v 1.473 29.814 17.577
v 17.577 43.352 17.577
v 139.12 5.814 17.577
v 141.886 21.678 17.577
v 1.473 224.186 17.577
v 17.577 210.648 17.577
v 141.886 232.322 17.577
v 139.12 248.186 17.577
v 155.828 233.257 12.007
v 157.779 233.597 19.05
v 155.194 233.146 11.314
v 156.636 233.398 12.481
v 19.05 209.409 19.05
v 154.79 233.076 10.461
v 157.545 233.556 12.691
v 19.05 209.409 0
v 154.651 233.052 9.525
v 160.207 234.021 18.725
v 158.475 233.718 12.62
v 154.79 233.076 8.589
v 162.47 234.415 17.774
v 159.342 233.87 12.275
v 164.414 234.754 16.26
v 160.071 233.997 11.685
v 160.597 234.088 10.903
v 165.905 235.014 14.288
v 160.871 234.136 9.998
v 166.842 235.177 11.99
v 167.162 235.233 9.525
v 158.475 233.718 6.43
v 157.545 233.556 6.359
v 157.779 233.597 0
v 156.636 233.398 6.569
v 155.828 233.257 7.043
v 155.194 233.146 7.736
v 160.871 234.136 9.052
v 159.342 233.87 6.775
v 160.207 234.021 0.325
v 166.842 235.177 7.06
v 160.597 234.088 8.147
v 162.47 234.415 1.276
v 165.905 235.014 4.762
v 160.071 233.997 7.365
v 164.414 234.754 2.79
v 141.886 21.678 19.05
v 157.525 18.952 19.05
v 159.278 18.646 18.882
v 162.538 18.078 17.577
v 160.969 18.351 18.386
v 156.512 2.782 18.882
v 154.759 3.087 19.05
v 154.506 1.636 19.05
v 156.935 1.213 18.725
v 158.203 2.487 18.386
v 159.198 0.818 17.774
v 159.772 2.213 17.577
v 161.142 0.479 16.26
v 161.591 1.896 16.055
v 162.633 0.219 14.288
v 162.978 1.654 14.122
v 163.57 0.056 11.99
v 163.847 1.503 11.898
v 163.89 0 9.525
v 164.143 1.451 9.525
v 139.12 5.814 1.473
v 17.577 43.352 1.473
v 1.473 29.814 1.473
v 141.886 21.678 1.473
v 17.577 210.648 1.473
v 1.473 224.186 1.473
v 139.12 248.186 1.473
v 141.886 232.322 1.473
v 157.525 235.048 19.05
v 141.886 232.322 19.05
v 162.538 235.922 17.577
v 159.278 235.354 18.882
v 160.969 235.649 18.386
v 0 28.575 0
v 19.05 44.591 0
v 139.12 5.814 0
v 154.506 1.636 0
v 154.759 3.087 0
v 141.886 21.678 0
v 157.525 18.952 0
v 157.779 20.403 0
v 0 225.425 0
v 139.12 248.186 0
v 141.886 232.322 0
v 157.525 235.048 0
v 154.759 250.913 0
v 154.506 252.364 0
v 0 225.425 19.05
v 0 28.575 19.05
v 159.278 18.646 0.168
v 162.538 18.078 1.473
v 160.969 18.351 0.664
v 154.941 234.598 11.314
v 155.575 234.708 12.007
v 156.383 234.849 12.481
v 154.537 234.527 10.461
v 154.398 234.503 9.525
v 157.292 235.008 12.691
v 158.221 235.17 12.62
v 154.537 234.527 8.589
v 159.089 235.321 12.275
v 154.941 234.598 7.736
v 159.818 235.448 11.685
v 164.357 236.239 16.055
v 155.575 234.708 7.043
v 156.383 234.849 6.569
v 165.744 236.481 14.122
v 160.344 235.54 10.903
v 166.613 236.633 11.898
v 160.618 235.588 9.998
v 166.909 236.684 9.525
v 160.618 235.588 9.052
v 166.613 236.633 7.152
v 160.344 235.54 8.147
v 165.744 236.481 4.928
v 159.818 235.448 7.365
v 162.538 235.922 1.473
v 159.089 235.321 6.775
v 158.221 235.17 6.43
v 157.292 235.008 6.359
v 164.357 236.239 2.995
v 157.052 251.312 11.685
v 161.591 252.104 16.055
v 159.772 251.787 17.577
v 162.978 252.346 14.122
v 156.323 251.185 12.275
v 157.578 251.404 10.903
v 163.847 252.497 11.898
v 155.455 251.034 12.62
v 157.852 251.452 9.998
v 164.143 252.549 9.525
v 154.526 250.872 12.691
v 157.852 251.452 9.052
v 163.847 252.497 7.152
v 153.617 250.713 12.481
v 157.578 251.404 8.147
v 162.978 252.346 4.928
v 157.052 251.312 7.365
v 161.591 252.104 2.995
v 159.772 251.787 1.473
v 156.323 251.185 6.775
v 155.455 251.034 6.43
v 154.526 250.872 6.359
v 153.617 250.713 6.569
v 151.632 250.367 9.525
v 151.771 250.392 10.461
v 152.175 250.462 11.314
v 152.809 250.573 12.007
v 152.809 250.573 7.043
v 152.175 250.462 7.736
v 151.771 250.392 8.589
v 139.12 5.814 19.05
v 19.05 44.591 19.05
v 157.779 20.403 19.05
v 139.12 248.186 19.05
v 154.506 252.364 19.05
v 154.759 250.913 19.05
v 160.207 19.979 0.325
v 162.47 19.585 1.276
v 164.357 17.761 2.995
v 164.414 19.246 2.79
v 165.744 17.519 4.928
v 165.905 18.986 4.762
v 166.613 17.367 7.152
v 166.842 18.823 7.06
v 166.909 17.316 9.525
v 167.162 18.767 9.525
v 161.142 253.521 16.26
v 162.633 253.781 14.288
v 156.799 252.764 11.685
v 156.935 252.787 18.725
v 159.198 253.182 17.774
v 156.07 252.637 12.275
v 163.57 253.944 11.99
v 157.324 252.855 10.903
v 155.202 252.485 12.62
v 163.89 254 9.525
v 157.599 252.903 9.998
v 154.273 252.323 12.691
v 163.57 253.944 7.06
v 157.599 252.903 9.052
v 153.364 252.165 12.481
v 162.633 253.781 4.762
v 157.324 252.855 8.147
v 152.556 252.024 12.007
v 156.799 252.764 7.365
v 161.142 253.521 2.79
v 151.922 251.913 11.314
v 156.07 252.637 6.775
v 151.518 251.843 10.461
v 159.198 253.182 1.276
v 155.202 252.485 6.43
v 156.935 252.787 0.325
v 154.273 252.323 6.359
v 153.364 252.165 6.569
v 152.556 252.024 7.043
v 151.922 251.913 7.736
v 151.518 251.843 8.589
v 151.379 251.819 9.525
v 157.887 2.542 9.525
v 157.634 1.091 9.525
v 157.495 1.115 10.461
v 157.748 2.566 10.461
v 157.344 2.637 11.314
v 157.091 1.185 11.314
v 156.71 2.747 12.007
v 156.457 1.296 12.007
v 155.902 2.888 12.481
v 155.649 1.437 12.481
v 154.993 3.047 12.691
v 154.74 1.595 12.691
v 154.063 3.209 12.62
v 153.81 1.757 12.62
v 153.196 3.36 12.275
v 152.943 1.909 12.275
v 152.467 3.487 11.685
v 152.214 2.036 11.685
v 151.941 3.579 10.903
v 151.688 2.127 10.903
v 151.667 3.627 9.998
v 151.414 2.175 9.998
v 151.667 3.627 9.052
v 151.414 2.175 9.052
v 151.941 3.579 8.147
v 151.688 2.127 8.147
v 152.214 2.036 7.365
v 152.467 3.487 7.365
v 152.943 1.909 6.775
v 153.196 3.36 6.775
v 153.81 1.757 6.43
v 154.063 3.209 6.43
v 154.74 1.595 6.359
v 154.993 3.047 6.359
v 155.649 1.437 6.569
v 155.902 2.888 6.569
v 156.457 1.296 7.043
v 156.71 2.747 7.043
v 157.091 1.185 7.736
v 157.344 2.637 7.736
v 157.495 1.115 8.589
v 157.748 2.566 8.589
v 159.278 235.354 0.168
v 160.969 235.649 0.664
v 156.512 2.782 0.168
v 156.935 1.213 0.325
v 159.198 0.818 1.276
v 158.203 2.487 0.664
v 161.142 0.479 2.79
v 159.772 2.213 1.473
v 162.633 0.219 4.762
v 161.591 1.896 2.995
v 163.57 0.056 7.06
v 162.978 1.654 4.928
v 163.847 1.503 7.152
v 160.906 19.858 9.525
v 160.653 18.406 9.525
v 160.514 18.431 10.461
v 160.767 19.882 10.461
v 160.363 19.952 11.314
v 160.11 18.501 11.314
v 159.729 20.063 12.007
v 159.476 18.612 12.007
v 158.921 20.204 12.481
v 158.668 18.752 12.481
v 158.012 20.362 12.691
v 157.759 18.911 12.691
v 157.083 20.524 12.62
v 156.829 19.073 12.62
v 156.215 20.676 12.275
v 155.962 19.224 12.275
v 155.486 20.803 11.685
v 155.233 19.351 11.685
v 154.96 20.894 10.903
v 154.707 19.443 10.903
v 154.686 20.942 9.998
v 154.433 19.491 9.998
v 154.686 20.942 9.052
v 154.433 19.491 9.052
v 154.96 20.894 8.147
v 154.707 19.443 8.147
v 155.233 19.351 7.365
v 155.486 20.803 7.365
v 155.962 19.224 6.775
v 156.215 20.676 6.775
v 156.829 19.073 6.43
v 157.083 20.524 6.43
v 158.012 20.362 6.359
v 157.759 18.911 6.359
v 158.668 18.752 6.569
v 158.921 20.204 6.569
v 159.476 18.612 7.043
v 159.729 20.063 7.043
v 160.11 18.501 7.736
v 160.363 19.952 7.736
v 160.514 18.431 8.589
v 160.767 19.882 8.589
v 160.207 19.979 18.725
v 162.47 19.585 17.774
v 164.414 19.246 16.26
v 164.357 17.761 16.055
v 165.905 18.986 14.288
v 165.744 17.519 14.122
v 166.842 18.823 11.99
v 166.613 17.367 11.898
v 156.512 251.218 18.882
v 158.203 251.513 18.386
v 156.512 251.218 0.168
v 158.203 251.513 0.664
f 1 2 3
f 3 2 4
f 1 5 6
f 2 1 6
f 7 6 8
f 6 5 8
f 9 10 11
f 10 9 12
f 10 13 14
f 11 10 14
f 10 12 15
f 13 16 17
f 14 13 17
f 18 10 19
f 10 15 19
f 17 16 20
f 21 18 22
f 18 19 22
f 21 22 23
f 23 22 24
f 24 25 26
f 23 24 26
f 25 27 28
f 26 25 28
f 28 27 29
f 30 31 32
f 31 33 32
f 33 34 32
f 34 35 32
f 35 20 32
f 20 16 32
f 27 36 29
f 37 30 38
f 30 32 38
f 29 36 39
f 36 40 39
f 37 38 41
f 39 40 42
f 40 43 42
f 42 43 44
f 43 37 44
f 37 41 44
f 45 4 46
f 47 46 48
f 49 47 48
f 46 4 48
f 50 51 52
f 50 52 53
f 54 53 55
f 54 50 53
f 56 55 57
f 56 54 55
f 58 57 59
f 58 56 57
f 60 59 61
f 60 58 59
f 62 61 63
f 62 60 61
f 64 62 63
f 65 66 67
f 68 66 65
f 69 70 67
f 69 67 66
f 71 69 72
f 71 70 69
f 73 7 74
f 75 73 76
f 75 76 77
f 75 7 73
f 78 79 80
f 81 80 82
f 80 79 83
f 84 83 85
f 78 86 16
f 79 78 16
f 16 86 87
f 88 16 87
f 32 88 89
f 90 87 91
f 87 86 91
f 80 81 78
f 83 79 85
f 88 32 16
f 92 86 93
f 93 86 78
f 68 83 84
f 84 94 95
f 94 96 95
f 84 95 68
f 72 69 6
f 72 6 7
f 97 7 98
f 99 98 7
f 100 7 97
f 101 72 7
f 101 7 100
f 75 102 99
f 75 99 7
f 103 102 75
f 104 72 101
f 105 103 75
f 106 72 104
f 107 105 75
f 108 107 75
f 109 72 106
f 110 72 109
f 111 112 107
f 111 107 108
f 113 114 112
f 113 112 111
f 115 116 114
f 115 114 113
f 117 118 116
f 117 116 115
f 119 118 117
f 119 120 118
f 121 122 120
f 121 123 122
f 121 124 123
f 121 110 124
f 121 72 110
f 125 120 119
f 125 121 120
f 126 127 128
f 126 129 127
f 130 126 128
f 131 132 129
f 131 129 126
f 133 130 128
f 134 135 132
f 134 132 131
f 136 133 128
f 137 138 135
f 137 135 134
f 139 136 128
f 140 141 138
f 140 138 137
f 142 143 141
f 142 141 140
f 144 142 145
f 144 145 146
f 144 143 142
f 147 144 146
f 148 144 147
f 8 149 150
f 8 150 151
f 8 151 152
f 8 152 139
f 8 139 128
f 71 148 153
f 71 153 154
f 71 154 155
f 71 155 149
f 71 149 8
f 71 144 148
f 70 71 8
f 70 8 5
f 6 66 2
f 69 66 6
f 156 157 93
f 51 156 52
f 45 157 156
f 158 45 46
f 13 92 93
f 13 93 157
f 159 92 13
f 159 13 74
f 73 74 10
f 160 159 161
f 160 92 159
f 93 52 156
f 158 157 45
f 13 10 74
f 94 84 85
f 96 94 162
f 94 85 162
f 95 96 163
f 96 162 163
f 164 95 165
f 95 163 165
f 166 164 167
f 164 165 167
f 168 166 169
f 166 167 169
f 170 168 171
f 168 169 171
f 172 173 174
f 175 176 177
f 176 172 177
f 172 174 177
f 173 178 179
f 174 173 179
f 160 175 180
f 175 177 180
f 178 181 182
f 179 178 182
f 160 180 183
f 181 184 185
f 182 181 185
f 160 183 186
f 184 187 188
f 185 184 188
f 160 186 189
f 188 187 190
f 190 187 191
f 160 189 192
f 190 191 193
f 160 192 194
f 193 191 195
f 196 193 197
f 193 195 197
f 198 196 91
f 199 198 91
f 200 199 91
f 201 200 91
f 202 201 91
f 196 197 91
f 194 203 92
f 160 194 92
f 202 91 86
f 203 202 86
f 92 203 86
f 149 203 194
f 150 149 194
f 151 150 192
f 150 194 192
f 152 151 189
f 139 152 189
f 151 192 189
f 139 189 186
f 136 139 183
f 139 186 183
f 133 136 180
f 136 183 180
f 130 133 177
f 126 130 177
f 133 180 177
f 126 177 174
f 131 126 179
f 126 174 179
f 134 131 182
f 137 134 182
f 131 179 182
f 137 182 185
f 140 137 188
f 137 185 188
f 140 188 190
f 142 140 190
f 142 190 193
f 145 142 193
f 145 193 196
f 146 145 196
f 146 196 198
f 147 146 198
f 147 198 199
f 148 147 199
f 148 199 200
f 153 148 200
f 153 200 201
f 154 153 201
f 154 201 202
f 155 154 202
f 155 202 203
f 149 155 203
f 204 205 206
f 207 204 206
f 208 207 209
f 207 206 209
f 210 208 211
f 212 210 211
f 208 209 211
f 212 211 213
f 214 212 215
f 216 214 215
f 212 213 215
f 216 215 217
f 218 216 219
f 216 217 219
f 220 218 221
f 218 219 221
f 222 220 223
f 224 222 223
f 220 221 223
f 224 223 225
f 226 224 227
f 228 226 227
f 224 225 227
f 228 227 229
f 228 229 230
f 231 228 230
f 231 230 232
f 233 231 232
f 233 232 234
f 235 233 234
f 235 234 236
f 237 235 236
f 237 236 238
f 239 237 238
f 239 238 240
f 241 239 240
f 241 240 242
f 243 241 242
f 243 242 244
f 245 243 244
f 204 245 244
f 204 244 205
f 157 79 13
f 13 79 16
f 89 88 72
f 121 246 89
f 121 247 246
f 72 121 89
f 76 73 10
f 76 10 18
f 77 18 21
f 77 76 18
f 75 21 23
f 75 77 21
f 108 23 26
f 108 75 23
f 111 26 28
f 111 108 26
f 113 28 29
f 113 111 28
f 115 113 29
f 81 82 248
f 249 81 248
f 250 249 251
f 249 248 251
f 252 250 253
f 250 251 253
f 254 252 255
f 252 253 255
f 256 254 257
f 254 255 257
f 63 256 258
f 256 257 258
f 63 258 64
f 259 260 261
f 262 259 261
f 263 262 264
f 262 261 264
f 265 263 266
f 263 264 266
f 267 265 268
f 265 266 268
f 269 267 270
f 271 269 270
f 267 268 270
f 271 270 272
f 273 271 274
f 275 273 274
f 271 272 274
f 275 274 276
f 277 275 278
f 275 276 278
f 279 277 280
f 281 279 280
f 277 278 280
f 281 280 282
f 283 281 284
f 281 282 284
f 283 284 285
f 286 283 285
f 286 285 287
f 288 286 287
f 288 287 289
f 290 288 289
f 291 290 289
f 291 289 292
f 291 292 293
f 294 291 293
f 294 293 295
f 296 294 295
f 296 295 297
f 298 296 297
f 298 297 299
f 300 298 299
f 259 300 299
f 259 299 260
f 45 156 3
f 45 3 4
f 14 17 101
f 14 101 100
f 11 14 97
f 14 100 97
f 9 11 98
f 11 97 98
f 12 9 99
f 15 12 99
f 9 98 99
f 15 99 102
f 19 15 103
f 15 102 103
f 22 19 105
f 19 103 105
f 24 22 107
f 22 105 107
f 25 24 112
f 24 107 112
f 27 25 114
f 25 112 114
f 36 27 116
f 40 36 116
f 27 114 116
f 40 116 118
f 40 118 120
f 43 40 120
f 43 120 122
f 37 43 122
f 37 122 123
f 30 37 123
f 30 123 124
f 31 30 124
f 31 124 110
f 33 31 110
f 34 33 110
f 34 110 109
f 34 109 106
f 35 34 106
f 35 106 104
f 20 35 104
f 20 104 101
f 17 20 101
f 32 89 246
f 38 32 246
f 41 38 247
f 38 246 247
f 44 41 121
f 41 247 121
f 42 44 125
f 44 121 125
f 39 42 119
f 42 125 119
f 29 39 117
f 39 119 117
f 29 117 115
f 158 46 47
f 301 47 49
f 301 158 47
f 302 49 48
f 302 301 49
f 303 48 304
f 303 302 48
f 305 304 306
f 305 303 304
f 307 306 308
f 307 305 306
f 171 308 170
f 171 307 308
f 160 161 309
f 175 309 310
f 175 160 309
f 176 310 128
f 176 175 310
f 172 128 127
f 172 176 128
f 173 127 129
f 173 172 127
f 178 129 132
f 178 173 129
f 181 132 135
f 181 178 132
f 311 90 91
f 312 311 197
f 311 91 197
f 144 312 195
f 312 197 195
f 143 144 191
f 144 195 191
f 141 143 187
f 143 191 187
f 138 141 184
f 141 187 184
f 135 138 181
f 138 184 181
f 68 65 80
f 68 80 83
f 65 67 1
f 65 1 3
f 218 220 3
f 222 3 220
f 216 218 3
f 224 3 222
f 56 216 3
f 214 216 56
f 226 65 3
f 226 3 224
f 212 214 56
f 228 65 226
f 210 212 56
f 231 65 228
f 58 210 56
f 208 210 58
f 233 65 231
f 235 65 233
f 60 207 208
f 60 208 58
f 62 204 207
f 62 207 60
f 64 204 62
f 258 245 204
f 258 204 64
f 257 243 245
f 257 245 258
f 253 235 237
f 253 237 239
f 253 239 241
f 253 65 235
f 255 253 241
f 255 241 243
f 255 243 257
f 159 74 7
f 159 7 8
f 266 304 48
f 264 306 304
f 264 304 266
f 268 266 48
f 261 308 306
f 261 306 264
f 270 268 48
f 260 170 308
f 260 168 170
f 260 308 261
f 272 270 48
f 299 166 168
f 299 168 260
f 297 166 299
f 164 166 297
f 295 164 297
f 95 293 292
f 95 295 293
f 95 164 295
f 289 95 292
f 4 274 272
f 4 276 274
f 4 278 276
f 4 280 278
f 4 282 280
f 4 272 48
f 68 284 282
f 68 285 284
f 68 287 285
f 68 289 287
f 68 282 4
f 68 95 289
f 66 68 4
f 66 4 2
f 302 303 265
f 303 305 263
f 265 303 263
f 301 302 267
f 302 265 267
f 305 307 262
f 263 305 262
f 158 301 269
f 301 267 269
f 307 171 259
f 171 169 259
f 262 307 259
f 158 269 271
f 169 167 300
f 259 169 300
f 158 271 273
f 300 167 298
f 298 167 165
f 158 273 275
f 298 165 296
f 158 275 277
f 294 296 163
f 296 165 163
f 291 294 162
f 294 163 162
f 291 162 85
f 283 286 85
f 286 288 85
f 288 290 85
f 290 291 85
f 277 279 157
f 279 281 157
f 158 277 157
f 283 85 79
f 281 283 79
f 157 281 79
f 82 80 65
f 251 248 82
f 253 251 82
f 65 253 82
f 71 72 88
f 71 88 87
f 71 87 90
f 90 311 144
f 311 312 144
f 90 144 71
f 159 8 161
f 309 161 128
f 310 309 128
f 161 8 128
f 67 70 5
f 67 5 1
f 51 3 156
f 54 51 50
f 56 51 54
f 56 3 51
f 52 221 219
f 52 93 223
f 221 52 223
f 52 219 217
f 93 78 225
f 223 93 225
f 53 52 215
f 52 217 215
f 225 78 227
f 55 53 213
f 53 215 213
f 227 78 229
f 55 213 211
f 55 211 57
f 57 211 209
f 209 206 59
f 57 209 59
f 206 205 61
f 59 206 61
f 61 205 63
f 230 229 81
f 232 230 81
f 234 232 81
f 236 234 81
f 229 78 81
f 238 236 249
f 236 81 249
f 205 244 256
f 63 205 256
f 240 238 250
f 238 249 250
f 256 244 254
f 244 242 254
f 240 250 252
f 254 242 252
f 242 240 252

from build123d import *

# Parameters (mm, degrees)
F1_DEPTH  = 19.05
F2_T      = -1.4732
F3_W      = 16.1036
F3_H      = 19.05
F4_DEPTH  = 25.4
F5_R      = 9.52499
F6_R      = 3.175
F7_DEPTH  = 250.7881261572
F8_W      = 16.1036
F8_H      = 19.05
F9_DEPTH  = 25.4
F10_R     = 9.52499
F11_R     = 3.175
F12_DEPTH = 250.7881261572


# Not quite as in the source:
# - a fillet or chamfer is up to 0.001 mm smaller than in the source, because OpenCascade refuses the exact size


with BuildPart() as f1:
    # F0 (on Top) → F1 (new body)
    with BuildSketch(Plane.XY):
        Polygon((0, 225.425), (0, 28.575), (163.8898551464, 0), (167.1619531291, 18.766882394), (19.05, 44.5909277987), (19.05, 209.4090722013), (167.1619531291, 235.233117606), (163.8898551464, 254), align=None)
    extrude(amount=F1_DEPTH)

    # F2
    f2_openings = [f1.faces().sort_by_distance(p)[0] for p in [
        (165.525904, 9.383441, 9.525),
        (165.525904, 244.616559, 9.525),
    ]]
    offset(amount=F2_T, openings=f2_openings, kind=Kind.INTERSECTION)

    # F3 (on face) → F4 (cut)
    with BuildSketch(Plane(origin=(159.0546521525, -27.731958645, 0), x_dir=(0.1717636736, 0.9851381834, 0), z_dir=(0.9851381834, -0.1717636736, 0))):
        with Locations((37.6753235911, 9.525)):
            Rectangle(F3_W, F3_H)
    extrude(amount=-F4_DEPTH, mode=Mode.SUBTRACT)

    # F5 (radius 9.525 in the source; OpenCascade refuses exactly that, so slightly less here)
    f5_edges = [f1.edges().sort_by_distance(p)[0] for p in [
        (164.016376, 0.725653, 19.05),
        (167.035432, 18.04123, 19.05),
        (164.016376, 0.725653, 0),
        (167.035432, 18.04123, 0),
    ]]
    fillet(f5_edges, radius=F5_R)

    # F6 (on face) → F7 (cut, through all)
    with BuildSketch(Plane(origin=(4.8352029939, 27.731958645, 0), x_dir=(0.9851381834, -0.1717636736, 0), z_dir=(-0.1717636736, -0.9851381834, 0))):
        with Locations((151.9291541789, 9.525)):
            Circle(F6_R)
    extrude(amount=-F7_DEPTH, mode=Mode.SUBTRACT)

    # F8 (on face) → F9 (cut)
    with BuildSketch(Plane(origin=(202.0342343209, 35.2256595783, 0), x_dir=(-0.1717636736, 0.9851381834, 0), z_dir=(0.9851381834, 0.1717636736, 0))):
        with Locations((212.5497749961, 9.525)):
            Rectangle(F8_W, F8_H)
    extrude(amount=-F9_DEPTH, mode=Mode.SUBTRACT)

    # F10 (radius 9.525 in the source; OpenCascade refuses exactly that, so slightly less here)
    f10_edges = [f1.edges().sort_by_distance(p)[0] for p in [
        (164.016376, 253.274347, 0),
        (164.016376, 253.274347, 19.05),
        (167.035432, 235.95877, 19.05),
        (167.035432, 235.95877, 0),
    ]]
    fillet(f10_edges, radius=F10_R)

    # F11 (on face) → F12 (cut, through all)
    with BuildSketch(Plane(origin=(-38.1443791745, 218.7743404217, 0), x_dir=(-0.9851381834, -0.1717636736, 0), z_dir=(-0.1717636736, 0.9851381834, 0))):
        with Locations((-195.5571272816, 9.525)):
            Circle(F11_R)
    extrude(amount=-F12_DEPTH, mode=Mode.SUBTRACT)


solid = f1.part
